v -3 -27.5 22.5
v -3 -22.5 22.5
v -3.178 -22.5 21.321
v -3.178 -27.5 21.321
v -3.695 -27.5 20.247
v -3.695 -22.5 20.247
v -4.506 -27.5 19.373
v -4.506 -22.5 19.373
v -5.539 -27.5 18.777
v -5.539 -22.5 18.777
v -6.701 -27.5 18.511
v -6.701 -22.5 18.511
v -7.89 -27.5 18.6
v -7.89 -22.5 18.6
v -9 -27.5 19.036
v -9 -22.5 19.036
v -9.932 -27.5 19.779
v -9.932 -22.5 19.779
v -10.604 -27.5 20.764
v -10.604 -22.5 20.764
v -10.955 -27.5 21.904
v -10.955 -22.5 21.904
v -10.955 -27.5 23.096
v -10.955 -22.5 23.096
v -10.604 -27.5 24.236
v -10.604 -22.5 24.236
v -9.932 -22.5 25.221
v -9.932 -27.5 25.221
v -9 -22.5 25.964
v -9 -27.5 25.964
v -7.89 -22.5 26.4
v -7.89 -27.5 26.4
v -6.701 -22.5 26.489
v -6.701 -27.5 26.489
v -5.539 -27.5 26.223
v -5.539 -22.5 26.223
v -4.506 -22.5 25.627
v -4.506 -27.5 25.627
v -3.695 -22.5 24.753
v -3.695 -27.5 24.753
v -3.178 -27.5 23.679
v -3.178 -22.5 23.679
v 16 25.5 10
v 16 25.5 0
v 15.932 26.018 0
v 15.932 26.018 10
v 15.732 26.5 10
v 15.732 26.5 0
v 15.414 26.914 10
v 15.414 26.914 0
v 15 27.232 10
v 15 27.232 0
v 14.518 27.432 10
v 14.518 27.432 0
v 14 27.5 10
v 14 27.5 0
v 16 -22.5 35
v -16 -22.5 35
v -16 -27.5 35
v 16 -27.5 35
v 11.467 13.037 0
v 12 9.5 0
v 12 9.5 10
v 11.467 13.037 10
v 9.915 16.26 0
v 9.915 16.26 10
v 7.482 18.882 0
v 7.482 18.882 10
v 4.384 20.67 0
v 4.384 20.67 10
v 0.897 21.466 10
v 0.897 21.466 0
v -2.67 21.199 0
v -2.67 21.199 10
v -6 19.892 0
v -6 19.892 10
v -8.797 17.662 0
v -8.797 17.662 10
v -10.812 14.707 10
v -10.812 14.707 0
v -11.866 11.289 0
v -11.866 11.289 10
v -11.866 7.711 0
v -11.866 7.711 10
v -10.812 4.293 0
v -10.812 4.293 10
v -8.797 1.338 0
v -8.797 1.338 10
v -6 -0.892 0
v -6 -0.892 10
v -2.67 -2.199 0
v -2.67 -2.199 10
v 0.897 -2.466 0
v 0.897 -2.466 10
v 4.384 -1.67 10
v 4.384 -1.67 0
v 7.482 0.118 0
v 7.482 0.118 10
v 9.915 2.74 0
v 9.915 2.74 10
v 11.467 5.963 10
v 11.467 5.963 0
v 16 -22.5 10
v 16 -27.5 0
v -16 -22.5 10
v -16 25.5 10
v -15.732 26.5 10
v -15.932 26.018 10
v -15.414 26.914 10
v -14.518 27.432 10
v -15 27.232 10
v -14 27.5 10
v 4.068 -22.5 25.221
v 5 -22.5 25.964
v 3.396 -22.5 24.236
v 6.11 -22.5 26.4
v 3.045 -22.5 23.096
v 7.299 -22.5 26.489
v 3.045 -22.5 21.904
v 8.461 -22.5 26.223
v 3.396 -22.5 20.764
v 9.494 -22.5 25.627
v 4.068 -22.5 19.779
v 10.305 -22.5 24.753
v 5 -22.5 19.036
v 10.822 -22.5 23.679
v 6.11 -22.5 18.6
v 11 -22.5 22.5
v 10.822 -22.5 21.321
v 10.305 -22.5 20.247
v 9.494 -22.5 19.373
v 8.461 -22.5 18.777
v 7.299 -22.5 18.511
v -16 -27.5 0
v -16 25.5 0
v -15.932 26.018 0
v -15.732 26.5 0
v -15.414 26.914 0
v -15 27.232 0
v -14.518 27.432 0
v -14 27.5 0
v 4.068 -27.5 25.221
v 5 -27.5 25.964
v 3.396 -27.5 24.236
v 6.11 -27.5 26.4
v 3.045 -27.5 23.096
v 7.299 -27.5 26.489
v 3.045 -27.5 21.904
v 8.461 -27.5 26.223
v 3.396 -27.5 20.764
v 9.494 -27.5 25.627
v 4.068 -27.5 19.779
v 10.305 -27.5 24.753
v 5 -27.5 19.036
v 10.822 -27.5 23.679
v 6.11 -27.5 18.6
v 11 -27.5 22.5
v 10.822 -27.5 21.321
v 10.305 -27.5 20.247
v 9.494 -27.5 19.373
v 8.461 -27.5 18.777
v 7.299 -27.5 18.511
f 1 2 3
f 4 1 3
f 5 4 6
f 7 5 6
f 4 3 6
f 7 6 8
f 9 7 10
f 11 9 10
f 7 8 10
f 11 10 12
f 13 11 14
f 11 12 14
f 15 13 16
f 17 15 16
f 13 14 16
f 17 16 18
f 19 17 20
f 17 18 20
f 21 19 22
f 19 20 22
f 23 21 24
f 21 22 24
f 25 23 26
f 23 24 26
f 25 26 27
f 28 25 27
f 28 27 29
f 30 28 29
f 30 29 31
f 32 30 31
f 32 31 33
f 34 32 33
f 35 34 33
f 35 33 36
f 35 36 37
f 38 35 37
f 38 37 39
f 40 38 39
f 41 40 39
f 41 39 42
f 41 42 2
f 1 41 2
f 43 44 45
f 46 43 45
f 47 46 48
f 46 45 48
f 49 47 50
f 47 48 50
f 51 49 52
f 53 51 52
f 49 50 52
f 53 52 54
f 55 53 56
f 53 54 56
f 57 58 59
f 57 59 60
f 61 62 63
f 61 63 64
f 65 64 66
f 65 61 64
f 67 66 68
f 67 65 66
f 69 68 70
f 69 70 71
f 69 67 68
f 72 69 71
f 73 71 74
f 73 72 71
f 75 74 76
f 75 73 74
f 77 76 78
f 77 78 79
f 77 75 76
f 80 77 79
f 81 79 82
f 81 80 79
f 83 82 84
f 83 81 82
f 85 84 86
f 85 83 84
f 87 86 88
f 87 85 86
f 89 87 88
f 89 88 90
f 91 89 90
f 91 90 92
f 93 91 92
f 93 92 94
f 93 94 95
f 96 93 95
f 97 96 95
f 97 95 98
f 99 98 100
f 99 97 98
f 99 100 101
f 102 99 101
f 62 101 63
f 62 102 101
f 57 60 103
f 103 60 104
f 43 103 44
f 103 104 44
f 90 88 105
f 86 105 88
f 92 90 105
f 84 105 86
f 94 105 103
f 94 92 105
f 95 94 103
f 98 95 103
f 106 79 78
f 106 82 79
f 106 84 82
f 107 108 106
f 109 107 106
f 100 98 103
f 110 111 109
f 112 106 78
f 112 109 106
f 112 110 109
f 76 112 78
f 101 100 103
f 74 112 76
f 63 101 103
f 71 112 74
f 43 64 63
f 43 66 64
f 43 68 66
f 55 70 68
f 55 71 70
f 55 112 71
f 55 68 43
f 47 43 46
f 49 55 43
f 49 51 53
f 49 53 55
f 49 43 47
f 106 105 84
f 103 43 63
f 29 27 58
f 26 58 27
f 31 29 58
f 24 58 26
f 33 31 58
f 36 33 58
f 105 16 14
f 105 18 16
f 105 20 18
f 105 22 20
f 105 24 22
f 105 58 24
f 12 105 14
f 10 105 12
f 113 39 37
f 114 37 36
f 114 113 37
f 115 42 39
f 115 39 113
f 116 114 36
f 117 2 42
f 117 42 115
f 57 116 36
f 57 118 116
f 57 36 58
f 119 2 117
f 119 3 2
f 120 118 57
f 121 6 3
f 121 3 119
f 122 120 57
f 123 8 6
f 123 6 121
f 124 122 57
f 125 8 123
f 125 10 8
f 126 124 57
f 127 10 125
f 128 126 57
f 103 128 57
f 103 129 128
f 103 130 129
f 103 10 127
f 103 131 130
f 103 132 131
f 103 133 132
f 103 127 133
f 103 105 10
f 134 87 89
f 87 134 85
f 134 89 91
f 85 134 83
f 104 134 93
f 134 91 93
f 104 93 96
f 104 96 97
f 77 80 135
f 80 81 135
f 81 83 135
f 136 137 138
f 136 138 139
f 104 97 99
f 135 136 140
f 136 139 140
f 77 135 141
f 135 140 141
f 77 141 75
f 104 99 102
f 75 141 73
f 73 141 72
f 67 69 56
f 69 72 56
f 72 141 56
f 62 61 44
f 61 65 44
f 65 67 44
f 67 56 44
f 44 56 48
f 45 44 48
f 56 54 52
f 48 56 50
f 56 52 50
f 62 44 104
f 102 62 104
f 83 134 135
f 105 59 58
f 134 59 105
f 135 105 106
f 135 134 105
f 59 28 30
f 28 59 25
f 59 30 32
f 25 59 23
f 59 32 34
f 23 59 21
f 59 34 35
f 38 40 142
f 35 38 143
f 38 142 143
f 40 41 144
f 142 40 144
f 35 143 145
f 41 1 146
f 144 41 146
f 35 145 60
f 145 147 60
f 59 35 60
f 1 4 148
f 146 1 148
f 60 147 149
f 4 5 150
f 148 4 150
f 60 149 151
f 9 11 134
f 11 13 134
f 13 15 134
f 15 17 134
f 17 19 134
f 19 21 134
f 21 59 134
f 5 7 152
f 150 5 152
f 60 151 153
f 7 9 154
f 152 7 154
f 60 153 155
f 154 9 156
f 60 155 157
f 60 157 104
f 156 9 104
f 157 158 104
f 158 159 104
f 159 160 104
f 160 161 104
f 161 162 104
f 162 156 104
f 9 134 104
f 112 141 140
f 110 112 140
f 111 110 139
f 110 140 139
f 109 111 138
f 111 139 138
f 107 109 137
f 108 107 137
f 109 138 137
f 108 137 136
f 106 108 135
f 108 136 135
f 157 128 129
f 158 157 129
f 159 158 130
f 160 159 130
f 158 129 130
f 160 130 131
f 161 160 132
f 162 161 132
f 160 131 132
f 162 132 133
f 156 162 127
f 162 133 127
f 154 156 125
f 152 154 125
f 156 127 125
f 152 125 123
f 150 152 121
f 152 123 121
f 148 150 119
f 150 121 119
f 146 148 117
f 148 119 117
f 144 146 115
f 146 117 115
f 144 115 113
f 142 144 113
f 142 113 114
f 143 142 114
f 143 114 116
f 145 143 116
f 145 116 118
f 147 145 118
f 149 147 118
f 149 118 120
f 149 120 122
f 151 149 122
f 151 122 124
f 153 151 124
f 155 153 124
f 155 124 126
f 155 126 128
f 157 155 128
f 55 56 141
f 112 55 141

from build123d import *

# Parameters (mm, degrees)
SKETCH1_R           = 12
BOSS_EXTRUDE1_DEPTH = 10
SKETCH2_W           = 32
SKETCH2_H           = 5
BOSS_EXTRUDE2_DEPTH = 25
SKETCH3_R           = 4
CUT_EXTRUDE1_DEPTH  = 25


with BuildPart() as part:
    # Sketch1 → Boss-Extrude1 (new body)
    with BuildSketch(Plane.XY):
        with BuildLine():
            Line((-16, -27.5), (16, -27.5))
            Line((16, -27.5), (16, 25.5))
            ThreePointArc((16, 25.5), (15.414213562, 26.914213562), (14, 27.5))
            Line((14, 27.5), (-14, 27.5))
            ThreePointArc((-14, 27.5), (-15.414213562, 26.914213562), (-16, 25.5))
            Line((-16, 25.5), (-16, -27.5))
        make_face()
        with Locations((0, 9.5)):
            Circle(SKETCH1_R, mode=Mode.SUBTRACT)
    extrude(amount=BOSS_EXTRUDE1_DEPTH)

    # Sketch2 → Boss-Extrude2 (add)
    with BuildSketch(Plane.XY.offset(10)):
        with Locations((0, -25)):
            Rectangle(SKETCH2_W, SKETCH2_H)
    extrude(amount=BOSS_EXTRUDE2_DEPTH)

    # Sketch3 → Cut-Extrude1 (cut)
    with BuildSketch(Plane(origin=(0, -22.5, 0), x_dir=(1, 0, 0), z_dir=(0, 1, 0))):
        with Locations((-7, -22.5)):
            Circle(SKETCH3_R)
        with Locations((7, -22.5)):
            Circle(SKETCH3_R)
    extrude(amount=-CUT_EXTRUDE1_DEPTH, mode=Mode.SUBTRACT)


solid = part.part
